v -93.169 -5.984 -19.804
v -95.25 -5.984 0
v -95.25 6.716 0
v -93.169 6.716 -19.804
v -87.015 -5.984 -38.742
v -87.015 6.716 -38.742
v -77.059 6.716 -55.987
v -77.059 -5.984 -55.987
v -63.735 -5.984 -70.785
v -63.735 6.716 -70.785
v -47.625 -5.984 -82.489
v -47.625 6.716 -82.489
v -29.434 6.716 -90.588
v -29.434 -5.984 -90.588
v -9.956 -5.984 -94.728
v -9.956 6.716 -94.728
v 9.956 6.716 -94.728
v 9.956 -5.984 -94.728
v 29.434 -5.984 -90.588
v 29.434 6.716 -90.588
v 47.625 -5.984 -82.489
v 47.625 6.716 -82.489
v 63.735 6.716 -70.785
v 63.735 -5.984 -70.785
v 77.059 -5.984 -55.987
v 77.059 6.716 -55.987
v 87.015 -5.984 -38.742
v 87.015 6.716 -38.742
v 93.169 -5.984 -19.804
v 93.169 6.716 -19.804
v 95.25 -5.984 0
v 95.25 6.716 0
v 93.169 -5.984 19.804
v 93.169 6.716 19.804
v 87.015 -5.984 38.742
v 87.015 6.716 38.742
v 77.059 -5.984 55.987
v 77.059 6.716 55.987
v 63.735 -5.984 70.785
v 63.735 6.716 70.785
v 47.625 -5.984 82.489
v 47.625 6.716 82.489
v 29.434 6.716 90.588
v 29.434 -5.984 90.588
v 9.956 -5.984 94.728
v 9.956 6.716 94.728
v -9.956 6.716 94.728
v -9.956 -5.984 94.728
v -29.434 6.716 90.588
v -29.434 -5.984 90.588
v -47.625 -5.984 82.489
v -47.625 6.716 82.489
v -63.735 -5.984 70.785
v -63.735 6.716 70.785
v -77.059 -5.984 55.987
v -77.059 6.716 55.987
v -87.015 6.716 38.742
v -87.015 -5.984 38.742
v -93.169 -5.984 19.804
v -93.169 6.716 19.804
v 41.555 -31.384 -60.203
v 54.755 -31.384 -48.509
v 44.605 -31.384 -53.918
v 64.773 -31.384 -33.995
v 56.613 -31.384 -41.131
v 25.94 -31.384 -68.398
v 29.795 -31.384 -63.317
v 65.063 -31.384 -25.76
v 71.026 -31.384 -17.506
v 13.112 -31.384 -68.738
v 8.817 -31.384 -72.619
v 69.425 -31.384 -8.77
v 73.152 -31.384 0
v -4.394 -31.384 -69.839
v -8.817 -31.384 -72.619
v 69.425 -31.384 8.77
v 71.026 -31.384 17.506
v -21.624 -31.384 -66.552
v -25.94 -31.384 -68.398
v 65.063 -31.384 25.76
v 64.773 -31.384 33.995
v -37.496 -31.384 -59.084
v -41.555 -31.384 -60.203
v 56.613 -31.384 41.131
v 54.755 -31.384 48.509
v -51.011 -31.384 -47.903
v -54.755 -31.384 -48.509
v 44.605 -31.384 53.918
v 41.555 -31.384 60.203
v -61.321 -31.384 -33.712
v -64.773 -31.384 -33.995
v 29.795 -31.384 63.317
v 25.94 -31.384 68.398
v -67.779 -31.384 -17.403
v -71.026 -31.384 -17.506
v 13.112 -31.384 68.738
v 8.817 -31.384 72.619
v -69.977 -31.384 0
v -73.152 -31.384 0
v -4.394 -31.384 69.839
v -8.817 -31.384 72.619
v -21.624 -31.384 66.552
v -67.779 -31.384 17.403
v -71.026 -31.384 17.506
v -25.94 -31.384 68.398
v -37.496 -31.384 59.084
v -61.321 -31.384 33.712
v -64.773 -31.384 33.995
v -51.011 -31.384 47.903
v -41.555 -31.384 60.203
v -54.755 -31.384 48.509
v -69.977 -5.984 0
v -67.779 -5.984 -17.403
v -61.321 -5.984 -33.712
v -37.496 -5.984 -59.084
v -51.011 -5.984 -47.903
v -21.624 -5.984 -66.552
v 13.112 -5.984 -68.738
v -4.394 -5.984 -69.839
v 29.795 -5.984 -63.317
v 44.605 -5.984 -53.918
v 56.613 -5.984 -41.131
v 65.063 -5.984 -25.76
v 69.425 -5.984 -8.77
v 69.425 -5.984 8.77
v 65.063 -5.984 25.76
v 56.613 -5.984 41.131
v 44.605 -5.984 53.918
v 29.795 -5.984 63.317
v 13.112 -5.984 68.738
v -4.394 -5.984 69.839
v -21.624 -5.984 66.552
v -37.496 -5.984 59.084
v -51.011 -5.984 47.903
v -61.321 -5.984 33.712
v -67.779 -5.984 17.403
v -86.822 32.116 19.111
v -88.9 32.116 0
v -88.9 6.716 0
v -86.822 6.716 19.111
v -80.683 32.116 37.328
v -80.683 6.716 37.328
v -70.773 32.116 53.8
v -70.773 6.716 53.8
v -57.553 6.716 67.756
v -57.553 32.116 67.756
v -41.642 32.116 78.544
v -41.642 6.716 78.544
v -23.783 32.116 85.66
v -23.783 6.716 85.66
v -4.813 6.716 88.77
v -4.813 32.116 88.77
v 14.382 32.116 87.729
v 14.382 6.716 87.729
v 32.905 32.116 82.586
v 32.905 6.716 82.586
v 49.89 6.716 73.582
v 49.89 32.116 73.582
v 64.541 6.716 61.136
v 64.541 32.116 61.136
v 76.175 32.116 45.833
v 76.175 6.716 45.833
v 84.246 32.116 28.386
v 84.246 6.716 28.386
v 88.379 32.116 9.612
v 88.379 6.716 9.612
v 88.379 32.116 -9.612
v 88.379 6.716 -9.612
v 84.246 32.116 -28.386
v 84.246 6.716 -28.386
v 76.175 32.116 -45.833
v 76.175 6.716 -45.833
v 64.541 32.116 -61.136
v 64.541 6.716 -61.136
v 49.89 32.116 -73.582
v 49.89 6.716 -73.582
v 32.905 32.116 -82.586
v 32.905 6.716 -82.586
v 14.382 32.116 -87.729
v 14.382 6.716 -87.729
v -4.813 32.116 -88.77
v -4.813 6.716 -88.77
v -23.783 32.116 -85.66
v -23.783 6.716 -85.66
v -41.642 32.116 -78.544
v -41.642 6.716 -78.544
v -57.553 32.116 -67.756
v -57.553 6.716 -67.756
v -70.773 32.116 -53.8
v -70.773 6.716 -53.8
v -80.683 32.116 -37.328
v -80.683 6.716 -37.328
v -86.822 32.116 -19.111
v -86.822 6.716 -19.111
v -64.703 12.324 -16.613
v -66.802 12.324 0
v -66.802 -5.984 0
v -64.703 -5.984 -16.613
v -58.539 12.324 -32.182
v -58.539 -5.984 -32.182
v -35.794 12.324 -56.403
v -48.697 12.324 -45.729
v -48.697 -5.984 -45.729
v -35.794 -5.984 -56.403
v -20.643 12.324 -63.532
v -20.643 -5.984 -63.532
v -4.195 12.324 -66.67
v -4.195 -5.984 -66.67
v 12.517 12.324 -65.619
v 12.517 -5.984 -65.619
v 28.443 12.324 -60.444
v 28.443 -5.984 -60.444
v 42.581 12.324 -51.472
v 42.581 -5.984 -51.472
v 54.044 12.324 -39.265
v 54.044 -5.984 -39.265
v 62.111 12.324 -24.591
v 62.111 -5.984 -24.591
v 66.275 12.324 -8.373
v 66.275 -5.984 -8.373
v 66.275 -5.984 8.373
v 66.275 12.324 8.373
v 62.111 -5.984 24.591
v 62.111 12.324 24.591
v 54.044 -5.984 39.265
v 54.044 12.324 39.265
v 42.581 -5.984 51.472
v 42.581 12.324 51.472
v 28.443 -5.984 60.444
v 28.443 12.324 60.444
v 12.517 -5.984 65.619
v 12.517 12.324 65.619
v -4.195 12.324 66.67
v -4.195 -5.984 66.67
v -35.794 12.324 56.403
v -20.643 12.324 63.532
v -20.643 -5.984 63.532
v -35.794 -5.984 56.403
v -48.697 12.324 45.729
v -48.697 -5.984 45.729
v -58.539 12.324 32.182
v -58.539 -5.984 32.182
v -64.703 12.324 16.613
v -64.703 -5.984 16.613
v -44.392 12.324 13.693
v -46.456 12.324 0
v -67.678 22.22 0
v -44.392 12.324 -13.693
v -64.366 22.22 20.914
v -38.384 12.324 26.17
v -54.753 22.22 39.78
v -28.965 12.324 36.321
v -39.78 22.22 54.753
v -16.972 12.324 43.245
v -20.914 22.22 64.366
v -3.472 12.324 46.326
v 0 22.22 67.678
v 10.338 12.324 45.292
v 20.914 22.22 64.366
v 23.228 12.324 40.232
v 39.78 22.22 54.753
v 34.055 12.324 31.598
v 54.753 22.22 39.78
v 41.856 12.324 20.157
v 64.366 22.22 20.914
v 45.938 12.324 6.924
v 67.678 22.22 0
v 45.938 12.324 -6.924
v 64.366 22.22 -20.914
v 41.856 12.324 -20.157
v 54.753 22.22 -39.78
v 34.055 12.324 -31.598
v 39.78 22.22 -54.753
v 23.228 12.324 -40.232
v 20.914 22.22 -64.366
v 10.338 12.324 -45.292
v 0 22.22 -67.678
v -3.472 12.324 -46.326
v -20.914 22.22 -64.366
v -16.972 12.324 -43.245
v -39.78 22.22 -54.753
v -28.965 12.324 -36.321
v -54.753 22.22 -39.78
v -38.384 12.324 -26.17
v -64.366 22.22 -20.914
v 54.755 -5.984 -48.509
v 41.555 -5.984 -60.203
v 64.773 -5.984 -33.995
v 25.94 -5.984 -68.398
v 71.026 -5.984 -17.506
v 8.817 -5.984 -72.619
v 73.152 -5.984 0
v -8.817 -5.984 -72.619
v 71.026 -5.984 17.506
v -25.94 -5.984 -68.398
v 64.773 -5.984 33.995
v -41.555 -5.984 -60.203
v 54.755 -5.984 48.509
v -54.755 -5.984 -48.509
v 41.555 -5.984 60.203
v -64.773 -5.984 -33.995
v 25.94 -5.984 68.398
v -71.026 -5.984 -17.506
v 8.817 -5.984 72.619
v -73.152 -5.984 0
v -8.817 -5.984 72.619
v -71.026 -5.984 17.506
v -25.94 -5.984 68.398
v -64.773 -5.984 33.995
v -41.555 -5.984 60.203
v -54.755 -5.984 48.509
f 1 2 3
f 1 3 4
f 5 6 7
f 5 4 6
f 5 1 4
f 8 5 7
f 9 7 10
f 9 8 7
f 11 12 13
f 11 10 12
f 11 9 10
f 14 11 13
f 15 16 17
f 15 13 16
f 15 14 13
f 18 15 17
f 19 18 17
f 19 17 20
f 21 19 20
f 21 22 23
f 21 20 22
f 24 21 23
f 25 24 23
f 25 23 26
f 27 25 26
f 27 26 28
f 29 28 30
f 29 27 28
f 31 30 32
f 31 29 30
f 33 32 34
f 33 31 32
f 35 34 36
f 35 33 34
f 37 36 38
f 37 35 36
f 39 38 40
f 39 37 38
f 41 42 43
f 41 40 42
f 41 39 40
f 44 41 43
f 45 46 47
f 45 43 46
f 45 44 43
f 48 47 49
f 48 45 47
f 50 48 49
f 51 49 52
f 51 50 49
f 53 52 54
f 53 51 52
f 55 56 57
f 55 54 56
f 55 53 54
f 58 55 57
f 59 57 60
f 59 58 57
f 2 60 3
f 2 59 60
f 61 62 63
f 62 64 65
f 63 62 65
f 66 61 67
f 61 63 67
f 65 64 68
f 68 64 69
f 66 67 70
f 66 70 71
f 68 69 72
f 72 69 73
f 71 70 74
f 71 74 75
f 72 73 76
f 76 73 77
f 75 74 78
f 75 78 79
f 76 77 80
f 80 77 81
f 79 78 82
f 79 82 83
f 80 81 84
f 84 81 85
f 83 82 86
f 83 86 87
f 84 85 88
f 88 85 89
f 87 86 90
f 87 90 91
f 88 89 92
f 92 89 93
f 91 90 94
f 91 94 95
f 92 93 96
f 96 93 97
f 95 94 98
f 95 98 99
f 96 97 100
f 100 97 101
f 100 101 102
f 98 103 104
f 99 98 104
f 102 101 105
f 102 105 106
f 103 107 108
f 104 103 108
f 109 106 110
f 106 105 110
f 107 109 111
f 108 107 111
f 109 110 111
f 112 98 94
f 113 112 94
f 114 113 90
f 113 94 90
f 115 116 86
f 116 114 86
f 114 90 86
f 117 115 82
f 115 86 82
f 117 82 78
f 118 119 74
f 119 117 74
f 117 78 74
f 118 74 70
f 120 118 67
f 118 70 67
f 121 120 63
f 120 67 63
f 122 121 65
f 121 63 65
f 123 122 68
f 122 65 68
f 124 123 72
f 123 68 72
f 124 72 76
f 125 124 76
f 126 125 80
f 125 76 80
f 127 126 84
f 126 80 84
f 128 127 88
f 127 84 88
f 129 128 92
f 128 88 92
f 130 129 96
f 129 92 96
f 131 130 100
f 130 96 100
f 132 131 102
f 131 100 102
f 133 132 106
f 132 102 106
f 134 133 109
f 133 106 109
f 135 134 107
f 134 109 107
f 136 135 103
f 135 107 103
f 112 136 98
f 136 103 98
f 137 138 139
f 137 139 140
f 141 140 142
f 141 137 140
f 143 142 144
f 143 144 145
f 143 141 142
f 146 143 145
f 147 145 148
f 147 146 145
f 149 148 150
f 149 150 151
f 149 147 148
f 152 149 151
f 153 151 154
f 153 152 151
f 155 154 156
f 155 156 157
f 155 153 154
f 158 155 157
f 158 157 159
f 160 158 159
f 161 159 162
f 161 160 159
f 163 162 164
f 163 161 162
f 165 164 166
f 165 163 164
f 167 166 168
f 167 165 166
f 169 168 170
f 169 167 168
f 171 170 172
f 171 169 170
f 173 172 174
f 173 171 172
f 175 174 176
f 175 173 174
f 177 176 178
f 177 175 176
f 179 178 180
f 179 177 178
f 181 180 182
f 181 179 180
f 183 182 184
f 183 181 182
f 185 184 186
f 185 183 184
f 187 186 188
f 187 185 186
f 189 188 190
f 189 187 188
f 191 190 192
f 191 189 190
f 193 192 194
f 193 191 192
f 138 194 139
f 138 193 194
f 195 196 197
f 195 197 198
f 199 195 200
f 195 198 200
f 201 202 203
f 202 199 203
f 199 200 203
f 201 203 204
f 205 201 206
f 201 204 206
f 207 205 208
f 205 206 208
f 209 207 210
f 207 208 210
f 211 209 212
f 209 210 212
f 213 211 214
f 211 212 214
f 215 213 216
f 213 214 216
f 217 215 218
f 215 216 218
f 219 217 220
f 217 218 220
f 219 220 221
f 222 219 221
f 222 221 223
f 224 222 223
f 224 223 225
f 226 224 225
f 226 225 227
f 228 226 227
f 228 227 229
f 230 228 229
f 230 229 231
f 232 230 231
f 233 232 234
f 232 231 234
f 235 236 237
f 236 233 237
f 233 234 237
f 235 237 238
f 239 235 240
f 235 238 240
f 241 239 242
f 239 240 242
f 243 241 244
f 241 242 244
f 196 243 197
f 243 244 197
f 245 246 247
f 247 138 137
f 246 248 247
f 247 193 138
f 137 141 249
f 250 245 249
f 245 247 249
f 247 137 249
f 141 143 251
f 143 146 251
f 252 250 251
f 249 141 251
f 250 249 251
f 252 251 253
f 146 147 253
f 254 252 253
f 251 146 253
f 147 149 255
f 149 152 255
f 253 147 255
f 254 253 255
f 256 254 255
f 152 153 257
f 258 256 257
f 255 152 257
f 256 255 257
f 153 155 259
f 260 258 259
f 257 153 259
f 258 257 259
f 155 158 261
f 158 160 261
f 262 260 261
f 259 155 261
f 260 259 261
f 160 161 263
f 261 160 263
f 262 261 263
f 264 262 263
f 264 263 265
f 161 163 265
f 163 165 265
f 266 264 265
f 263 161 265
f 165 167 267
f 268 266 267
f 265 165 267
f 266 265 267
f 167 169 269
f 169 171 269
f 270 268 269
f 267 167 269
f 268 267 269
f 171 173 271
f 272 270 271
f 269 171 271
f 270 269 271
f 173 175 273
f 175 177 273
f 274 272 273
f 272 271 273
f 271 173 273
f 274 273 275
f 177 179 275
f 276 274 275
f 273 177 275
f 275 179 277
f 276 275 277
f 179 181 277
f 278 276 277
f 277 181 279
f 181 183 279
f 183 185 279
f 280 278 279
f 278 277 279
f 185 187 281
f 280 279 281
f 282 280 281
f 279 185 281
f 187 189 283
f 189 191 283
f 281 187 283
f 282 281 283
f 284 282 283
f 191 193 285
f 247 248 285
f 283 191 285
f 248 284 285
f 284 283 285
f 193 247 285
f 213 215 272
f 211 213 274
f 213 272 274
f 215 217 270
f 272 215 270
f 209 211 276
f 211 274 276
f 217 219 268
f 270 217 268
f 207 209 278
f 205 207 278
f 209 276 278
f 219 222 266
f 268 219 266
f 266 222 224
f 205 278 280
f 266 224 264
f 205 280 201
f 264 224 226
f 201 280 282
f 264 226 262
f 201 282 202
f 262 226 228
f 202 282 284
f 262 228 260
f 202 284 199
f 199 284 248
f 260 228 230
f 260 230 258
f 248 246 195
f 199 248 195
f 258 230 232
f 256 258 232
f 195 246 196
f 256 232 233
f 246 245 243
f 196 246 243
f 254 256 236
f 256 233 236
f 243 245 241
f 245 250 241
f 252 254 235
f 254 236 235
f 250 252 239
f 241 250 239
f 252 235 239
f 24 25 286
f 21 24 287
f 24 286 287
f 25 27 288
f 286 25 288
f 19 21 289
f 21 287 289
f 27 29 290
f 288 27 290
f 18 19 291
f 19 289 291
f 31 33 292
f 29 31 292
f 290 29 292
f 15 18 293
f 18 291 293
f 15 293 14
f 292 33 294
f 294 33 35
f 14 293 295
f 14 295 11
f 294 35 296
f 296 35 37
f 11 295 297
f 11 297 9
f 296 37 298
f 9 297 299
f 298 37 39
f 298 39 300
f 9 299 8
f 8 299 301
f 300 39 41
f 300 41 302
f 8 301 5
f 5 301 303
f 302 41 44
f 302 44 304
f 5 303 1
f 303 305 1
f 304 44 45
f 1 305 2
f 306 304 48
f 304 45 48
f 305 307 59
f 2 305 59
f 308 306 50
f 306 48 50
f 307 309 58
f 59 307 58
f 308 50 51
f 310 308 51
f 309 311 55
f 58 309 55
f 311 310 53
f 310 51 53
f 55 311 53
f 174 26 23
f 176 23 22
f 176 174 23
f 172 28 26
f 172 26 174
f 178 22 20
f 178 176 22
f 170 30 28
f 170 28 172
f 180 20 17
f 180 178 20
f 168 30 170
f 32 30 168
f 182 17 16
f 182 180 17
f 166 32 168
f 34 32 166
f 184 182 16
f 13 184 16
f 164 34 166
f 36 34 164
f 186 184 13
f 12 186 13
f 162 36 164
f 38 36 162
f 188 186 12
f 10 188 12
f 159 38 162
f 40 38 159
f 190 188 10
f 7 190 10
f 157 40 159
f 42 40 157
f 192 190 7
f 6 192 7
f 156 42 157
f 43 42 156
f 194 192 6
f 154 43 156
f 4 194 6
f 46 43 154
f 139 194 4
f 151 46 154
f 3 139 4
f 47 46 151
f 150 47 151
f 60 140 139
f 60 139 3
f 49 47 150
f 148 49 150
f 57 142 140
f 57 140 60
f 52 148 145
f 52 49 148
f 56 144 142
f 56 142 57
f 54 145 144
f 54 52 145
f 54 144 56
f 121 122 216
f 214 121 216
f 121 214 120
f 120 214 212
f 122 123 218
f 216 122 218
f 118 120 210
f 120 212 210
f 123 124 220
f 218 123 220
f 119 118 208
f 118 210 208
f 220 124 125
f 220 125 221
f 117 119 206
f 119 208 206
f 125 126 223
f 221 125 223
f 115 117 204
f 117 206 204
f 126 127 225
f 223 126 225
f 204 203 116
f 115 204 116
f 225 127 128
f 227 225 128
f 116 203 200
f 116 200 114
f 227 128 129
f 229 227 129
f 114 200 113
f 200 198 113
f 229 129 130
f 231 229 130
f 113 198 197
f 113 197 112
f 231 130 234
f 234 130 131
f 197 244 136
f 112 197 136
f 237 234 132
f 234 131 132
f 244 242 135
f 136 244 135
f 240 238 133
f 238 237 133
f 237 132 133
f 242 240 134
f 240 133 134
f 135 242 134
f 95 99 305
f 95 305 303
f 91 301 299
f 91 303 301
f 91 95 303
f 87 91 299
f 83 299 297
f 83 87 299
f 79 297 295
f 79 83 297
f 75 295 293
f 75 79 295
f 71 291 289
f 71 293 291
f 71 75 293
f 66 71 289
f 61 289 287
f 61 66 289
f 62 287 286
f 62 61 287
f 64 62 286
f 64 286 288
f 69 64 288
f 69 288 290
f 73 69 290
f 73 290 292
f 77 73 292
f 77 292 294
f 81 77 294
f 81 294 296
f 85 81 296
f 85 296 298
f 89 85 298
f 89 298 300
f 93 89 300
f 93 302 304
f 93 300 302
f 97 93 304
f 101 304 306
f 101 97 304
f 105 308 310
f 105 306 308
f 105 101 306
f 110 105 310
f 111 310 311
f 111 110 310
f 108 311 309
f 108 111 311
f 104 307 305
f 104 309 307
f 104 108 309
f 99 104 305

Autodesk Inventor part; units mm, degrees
ref_plane "YZ Plane" through (0, 0, 0) normal (1, 0, 0) x (0, 1, 0)
ref_plane "XZ Plane" through (0, 0, 0) normal (0, 1, 0) x (-1, 0, 0)
ref_plane "XY Plane" through (0, 0, 0) normal (0, 0, 1) x (1, 0, 0)
sketch "Sketch1" plane through (0, 0, 0) normal (0, 0, 1) x (1, 0, 0)
  arc A0 (-28.9184, -1.6435) -> (-32.3684, 5.7551) centre (-35.052, 0) ccw
  line L0 (-28.702, 47.5942) -> (-28.702, -124.4009) construction
  line L1 (-32.3684, 5.7551) -> (-88.9, 32.1162)
  line L2 (-28.9184, -1.6435) -> (-86.2301, -215.5338)
  line L3 (-46.4564, 12.3244) -> (-66.802, 12.3244)
  line L4 (-60.4508, -95.6256) -> (-54.1008, -95.6256)
  line L5 (-73.152, -5.9838) -> (-73.152, -131.1779)
  line L6 (-73.152, -131.1779) -> (-63.627, -131.1779)
  line L7 (58.5667, 38.1) -> (-194.088, 38.1) construction
  line L8 (-95.25, 6.7162) -> (-95.25, -5.9838)
  line L9 (-95.25, 6.7162) -> (-88.9, 6.7162)
  line L10 (-88.9, 6.7162) -> (-88.9, 32.1162)
  line L11 (-95.25, -5.9838) -> (-73.152, -5.9838)
  line L12 (-95.25, -5.9838) -> (-95.25, -18.6838)
  line L13 (-95.25, -18.6838) -> (-89.3064, -18.6838)
  line L14 (-89.3064, -18.6838) -> (-89.3064, -24.6274)
  line L15 (-89.3064, -24.6274) -> (-95.25, -24.6274)
  line L16 (-95.25, -24.6274) -> (-95.25, -82.1838)
  line L17 (-95.25, -82.1838) -> (-82.55, -82.1838)
  line L18 (-89.3064, -18.6838) -> (-82.55, -18.6838)
  line L19 (-82.55, -18.6838) -> (-82.55, -82.1838)
  line L20 (-95.25, -82.1838) -> (-101.6, -82.1838)
  line L21 (-66.802, 12.3244) -> (-66.802, -31.3838)
  line L22 (-66.802, -31.3838) -> (-60.4508, -95.6256)
  line L23 (-82.55, -178.1009) -> (-76.2, -178.1009)
  line L24 (-82.55, -82.1838) -> (-82.55, -178.1009)
  line L25 (-86.2301, -215.5338) -> (-89.4051, -215.5338)
  line L26 (-89.4051, -215.5338) -> (-101.6, -82.1838)
  line L27 (-69.977, -5.9838) -> (-69.977, -31.3838)
  line L28 (-69.977, -31.3838) -> (-73.152, -31.3838)
  line L29 (-69.977, -5.9838) -> (-66.802, -5.9838)
  line L30 (-101.6, -82.1838) -> (-28.702, -82.1838) construction
  line L31 (0, -210.5351) -> (0, 86.485) construction
  point P0 (0, 0)
  dimension "d0" = 12.7
  dimension "d1" = 28.702
  dimension "d3" = 15
  dimension "d4" = 6.35
  dimension "d9" = 38.1
  dimension "d11" = 12.7
  dimension "d13" = 95.25
  dimension "d14" = 6.35
  dimension "d15" = 25.4
  dimension "d17" = 12.7
  dimension "d18" = 5.9436
  dimension "d19" = 5.9436
  dimension "d20" = 12.7
  dimension "d22" = 107.95
  dimension "d23" = 63.5
  dimension "d25" = 25.4
  dimension "d26" = 6.35
  dimension "d27" = 133.35
  dimension "d28" = 3.175
  dimension "d29" = 101.6
  dimension "d30" = 6.35
  dimension "d31" = 25
  dimension "d32" = 44.45
  dimension "d33" = 3.175
  dimension "d34" = 20.3456
  dimension "d35" = 9.525
revolve "Revolution1" add sketch "Sketch1" angle 360 about axis through (0, -210.5351, 0) along (0, 1, 0) contours L3 L21 L29 L27 L28 L5 L11 L8 L9 L10 L1
properties part number "phenolic_cap" material "Phenolic Resin"
